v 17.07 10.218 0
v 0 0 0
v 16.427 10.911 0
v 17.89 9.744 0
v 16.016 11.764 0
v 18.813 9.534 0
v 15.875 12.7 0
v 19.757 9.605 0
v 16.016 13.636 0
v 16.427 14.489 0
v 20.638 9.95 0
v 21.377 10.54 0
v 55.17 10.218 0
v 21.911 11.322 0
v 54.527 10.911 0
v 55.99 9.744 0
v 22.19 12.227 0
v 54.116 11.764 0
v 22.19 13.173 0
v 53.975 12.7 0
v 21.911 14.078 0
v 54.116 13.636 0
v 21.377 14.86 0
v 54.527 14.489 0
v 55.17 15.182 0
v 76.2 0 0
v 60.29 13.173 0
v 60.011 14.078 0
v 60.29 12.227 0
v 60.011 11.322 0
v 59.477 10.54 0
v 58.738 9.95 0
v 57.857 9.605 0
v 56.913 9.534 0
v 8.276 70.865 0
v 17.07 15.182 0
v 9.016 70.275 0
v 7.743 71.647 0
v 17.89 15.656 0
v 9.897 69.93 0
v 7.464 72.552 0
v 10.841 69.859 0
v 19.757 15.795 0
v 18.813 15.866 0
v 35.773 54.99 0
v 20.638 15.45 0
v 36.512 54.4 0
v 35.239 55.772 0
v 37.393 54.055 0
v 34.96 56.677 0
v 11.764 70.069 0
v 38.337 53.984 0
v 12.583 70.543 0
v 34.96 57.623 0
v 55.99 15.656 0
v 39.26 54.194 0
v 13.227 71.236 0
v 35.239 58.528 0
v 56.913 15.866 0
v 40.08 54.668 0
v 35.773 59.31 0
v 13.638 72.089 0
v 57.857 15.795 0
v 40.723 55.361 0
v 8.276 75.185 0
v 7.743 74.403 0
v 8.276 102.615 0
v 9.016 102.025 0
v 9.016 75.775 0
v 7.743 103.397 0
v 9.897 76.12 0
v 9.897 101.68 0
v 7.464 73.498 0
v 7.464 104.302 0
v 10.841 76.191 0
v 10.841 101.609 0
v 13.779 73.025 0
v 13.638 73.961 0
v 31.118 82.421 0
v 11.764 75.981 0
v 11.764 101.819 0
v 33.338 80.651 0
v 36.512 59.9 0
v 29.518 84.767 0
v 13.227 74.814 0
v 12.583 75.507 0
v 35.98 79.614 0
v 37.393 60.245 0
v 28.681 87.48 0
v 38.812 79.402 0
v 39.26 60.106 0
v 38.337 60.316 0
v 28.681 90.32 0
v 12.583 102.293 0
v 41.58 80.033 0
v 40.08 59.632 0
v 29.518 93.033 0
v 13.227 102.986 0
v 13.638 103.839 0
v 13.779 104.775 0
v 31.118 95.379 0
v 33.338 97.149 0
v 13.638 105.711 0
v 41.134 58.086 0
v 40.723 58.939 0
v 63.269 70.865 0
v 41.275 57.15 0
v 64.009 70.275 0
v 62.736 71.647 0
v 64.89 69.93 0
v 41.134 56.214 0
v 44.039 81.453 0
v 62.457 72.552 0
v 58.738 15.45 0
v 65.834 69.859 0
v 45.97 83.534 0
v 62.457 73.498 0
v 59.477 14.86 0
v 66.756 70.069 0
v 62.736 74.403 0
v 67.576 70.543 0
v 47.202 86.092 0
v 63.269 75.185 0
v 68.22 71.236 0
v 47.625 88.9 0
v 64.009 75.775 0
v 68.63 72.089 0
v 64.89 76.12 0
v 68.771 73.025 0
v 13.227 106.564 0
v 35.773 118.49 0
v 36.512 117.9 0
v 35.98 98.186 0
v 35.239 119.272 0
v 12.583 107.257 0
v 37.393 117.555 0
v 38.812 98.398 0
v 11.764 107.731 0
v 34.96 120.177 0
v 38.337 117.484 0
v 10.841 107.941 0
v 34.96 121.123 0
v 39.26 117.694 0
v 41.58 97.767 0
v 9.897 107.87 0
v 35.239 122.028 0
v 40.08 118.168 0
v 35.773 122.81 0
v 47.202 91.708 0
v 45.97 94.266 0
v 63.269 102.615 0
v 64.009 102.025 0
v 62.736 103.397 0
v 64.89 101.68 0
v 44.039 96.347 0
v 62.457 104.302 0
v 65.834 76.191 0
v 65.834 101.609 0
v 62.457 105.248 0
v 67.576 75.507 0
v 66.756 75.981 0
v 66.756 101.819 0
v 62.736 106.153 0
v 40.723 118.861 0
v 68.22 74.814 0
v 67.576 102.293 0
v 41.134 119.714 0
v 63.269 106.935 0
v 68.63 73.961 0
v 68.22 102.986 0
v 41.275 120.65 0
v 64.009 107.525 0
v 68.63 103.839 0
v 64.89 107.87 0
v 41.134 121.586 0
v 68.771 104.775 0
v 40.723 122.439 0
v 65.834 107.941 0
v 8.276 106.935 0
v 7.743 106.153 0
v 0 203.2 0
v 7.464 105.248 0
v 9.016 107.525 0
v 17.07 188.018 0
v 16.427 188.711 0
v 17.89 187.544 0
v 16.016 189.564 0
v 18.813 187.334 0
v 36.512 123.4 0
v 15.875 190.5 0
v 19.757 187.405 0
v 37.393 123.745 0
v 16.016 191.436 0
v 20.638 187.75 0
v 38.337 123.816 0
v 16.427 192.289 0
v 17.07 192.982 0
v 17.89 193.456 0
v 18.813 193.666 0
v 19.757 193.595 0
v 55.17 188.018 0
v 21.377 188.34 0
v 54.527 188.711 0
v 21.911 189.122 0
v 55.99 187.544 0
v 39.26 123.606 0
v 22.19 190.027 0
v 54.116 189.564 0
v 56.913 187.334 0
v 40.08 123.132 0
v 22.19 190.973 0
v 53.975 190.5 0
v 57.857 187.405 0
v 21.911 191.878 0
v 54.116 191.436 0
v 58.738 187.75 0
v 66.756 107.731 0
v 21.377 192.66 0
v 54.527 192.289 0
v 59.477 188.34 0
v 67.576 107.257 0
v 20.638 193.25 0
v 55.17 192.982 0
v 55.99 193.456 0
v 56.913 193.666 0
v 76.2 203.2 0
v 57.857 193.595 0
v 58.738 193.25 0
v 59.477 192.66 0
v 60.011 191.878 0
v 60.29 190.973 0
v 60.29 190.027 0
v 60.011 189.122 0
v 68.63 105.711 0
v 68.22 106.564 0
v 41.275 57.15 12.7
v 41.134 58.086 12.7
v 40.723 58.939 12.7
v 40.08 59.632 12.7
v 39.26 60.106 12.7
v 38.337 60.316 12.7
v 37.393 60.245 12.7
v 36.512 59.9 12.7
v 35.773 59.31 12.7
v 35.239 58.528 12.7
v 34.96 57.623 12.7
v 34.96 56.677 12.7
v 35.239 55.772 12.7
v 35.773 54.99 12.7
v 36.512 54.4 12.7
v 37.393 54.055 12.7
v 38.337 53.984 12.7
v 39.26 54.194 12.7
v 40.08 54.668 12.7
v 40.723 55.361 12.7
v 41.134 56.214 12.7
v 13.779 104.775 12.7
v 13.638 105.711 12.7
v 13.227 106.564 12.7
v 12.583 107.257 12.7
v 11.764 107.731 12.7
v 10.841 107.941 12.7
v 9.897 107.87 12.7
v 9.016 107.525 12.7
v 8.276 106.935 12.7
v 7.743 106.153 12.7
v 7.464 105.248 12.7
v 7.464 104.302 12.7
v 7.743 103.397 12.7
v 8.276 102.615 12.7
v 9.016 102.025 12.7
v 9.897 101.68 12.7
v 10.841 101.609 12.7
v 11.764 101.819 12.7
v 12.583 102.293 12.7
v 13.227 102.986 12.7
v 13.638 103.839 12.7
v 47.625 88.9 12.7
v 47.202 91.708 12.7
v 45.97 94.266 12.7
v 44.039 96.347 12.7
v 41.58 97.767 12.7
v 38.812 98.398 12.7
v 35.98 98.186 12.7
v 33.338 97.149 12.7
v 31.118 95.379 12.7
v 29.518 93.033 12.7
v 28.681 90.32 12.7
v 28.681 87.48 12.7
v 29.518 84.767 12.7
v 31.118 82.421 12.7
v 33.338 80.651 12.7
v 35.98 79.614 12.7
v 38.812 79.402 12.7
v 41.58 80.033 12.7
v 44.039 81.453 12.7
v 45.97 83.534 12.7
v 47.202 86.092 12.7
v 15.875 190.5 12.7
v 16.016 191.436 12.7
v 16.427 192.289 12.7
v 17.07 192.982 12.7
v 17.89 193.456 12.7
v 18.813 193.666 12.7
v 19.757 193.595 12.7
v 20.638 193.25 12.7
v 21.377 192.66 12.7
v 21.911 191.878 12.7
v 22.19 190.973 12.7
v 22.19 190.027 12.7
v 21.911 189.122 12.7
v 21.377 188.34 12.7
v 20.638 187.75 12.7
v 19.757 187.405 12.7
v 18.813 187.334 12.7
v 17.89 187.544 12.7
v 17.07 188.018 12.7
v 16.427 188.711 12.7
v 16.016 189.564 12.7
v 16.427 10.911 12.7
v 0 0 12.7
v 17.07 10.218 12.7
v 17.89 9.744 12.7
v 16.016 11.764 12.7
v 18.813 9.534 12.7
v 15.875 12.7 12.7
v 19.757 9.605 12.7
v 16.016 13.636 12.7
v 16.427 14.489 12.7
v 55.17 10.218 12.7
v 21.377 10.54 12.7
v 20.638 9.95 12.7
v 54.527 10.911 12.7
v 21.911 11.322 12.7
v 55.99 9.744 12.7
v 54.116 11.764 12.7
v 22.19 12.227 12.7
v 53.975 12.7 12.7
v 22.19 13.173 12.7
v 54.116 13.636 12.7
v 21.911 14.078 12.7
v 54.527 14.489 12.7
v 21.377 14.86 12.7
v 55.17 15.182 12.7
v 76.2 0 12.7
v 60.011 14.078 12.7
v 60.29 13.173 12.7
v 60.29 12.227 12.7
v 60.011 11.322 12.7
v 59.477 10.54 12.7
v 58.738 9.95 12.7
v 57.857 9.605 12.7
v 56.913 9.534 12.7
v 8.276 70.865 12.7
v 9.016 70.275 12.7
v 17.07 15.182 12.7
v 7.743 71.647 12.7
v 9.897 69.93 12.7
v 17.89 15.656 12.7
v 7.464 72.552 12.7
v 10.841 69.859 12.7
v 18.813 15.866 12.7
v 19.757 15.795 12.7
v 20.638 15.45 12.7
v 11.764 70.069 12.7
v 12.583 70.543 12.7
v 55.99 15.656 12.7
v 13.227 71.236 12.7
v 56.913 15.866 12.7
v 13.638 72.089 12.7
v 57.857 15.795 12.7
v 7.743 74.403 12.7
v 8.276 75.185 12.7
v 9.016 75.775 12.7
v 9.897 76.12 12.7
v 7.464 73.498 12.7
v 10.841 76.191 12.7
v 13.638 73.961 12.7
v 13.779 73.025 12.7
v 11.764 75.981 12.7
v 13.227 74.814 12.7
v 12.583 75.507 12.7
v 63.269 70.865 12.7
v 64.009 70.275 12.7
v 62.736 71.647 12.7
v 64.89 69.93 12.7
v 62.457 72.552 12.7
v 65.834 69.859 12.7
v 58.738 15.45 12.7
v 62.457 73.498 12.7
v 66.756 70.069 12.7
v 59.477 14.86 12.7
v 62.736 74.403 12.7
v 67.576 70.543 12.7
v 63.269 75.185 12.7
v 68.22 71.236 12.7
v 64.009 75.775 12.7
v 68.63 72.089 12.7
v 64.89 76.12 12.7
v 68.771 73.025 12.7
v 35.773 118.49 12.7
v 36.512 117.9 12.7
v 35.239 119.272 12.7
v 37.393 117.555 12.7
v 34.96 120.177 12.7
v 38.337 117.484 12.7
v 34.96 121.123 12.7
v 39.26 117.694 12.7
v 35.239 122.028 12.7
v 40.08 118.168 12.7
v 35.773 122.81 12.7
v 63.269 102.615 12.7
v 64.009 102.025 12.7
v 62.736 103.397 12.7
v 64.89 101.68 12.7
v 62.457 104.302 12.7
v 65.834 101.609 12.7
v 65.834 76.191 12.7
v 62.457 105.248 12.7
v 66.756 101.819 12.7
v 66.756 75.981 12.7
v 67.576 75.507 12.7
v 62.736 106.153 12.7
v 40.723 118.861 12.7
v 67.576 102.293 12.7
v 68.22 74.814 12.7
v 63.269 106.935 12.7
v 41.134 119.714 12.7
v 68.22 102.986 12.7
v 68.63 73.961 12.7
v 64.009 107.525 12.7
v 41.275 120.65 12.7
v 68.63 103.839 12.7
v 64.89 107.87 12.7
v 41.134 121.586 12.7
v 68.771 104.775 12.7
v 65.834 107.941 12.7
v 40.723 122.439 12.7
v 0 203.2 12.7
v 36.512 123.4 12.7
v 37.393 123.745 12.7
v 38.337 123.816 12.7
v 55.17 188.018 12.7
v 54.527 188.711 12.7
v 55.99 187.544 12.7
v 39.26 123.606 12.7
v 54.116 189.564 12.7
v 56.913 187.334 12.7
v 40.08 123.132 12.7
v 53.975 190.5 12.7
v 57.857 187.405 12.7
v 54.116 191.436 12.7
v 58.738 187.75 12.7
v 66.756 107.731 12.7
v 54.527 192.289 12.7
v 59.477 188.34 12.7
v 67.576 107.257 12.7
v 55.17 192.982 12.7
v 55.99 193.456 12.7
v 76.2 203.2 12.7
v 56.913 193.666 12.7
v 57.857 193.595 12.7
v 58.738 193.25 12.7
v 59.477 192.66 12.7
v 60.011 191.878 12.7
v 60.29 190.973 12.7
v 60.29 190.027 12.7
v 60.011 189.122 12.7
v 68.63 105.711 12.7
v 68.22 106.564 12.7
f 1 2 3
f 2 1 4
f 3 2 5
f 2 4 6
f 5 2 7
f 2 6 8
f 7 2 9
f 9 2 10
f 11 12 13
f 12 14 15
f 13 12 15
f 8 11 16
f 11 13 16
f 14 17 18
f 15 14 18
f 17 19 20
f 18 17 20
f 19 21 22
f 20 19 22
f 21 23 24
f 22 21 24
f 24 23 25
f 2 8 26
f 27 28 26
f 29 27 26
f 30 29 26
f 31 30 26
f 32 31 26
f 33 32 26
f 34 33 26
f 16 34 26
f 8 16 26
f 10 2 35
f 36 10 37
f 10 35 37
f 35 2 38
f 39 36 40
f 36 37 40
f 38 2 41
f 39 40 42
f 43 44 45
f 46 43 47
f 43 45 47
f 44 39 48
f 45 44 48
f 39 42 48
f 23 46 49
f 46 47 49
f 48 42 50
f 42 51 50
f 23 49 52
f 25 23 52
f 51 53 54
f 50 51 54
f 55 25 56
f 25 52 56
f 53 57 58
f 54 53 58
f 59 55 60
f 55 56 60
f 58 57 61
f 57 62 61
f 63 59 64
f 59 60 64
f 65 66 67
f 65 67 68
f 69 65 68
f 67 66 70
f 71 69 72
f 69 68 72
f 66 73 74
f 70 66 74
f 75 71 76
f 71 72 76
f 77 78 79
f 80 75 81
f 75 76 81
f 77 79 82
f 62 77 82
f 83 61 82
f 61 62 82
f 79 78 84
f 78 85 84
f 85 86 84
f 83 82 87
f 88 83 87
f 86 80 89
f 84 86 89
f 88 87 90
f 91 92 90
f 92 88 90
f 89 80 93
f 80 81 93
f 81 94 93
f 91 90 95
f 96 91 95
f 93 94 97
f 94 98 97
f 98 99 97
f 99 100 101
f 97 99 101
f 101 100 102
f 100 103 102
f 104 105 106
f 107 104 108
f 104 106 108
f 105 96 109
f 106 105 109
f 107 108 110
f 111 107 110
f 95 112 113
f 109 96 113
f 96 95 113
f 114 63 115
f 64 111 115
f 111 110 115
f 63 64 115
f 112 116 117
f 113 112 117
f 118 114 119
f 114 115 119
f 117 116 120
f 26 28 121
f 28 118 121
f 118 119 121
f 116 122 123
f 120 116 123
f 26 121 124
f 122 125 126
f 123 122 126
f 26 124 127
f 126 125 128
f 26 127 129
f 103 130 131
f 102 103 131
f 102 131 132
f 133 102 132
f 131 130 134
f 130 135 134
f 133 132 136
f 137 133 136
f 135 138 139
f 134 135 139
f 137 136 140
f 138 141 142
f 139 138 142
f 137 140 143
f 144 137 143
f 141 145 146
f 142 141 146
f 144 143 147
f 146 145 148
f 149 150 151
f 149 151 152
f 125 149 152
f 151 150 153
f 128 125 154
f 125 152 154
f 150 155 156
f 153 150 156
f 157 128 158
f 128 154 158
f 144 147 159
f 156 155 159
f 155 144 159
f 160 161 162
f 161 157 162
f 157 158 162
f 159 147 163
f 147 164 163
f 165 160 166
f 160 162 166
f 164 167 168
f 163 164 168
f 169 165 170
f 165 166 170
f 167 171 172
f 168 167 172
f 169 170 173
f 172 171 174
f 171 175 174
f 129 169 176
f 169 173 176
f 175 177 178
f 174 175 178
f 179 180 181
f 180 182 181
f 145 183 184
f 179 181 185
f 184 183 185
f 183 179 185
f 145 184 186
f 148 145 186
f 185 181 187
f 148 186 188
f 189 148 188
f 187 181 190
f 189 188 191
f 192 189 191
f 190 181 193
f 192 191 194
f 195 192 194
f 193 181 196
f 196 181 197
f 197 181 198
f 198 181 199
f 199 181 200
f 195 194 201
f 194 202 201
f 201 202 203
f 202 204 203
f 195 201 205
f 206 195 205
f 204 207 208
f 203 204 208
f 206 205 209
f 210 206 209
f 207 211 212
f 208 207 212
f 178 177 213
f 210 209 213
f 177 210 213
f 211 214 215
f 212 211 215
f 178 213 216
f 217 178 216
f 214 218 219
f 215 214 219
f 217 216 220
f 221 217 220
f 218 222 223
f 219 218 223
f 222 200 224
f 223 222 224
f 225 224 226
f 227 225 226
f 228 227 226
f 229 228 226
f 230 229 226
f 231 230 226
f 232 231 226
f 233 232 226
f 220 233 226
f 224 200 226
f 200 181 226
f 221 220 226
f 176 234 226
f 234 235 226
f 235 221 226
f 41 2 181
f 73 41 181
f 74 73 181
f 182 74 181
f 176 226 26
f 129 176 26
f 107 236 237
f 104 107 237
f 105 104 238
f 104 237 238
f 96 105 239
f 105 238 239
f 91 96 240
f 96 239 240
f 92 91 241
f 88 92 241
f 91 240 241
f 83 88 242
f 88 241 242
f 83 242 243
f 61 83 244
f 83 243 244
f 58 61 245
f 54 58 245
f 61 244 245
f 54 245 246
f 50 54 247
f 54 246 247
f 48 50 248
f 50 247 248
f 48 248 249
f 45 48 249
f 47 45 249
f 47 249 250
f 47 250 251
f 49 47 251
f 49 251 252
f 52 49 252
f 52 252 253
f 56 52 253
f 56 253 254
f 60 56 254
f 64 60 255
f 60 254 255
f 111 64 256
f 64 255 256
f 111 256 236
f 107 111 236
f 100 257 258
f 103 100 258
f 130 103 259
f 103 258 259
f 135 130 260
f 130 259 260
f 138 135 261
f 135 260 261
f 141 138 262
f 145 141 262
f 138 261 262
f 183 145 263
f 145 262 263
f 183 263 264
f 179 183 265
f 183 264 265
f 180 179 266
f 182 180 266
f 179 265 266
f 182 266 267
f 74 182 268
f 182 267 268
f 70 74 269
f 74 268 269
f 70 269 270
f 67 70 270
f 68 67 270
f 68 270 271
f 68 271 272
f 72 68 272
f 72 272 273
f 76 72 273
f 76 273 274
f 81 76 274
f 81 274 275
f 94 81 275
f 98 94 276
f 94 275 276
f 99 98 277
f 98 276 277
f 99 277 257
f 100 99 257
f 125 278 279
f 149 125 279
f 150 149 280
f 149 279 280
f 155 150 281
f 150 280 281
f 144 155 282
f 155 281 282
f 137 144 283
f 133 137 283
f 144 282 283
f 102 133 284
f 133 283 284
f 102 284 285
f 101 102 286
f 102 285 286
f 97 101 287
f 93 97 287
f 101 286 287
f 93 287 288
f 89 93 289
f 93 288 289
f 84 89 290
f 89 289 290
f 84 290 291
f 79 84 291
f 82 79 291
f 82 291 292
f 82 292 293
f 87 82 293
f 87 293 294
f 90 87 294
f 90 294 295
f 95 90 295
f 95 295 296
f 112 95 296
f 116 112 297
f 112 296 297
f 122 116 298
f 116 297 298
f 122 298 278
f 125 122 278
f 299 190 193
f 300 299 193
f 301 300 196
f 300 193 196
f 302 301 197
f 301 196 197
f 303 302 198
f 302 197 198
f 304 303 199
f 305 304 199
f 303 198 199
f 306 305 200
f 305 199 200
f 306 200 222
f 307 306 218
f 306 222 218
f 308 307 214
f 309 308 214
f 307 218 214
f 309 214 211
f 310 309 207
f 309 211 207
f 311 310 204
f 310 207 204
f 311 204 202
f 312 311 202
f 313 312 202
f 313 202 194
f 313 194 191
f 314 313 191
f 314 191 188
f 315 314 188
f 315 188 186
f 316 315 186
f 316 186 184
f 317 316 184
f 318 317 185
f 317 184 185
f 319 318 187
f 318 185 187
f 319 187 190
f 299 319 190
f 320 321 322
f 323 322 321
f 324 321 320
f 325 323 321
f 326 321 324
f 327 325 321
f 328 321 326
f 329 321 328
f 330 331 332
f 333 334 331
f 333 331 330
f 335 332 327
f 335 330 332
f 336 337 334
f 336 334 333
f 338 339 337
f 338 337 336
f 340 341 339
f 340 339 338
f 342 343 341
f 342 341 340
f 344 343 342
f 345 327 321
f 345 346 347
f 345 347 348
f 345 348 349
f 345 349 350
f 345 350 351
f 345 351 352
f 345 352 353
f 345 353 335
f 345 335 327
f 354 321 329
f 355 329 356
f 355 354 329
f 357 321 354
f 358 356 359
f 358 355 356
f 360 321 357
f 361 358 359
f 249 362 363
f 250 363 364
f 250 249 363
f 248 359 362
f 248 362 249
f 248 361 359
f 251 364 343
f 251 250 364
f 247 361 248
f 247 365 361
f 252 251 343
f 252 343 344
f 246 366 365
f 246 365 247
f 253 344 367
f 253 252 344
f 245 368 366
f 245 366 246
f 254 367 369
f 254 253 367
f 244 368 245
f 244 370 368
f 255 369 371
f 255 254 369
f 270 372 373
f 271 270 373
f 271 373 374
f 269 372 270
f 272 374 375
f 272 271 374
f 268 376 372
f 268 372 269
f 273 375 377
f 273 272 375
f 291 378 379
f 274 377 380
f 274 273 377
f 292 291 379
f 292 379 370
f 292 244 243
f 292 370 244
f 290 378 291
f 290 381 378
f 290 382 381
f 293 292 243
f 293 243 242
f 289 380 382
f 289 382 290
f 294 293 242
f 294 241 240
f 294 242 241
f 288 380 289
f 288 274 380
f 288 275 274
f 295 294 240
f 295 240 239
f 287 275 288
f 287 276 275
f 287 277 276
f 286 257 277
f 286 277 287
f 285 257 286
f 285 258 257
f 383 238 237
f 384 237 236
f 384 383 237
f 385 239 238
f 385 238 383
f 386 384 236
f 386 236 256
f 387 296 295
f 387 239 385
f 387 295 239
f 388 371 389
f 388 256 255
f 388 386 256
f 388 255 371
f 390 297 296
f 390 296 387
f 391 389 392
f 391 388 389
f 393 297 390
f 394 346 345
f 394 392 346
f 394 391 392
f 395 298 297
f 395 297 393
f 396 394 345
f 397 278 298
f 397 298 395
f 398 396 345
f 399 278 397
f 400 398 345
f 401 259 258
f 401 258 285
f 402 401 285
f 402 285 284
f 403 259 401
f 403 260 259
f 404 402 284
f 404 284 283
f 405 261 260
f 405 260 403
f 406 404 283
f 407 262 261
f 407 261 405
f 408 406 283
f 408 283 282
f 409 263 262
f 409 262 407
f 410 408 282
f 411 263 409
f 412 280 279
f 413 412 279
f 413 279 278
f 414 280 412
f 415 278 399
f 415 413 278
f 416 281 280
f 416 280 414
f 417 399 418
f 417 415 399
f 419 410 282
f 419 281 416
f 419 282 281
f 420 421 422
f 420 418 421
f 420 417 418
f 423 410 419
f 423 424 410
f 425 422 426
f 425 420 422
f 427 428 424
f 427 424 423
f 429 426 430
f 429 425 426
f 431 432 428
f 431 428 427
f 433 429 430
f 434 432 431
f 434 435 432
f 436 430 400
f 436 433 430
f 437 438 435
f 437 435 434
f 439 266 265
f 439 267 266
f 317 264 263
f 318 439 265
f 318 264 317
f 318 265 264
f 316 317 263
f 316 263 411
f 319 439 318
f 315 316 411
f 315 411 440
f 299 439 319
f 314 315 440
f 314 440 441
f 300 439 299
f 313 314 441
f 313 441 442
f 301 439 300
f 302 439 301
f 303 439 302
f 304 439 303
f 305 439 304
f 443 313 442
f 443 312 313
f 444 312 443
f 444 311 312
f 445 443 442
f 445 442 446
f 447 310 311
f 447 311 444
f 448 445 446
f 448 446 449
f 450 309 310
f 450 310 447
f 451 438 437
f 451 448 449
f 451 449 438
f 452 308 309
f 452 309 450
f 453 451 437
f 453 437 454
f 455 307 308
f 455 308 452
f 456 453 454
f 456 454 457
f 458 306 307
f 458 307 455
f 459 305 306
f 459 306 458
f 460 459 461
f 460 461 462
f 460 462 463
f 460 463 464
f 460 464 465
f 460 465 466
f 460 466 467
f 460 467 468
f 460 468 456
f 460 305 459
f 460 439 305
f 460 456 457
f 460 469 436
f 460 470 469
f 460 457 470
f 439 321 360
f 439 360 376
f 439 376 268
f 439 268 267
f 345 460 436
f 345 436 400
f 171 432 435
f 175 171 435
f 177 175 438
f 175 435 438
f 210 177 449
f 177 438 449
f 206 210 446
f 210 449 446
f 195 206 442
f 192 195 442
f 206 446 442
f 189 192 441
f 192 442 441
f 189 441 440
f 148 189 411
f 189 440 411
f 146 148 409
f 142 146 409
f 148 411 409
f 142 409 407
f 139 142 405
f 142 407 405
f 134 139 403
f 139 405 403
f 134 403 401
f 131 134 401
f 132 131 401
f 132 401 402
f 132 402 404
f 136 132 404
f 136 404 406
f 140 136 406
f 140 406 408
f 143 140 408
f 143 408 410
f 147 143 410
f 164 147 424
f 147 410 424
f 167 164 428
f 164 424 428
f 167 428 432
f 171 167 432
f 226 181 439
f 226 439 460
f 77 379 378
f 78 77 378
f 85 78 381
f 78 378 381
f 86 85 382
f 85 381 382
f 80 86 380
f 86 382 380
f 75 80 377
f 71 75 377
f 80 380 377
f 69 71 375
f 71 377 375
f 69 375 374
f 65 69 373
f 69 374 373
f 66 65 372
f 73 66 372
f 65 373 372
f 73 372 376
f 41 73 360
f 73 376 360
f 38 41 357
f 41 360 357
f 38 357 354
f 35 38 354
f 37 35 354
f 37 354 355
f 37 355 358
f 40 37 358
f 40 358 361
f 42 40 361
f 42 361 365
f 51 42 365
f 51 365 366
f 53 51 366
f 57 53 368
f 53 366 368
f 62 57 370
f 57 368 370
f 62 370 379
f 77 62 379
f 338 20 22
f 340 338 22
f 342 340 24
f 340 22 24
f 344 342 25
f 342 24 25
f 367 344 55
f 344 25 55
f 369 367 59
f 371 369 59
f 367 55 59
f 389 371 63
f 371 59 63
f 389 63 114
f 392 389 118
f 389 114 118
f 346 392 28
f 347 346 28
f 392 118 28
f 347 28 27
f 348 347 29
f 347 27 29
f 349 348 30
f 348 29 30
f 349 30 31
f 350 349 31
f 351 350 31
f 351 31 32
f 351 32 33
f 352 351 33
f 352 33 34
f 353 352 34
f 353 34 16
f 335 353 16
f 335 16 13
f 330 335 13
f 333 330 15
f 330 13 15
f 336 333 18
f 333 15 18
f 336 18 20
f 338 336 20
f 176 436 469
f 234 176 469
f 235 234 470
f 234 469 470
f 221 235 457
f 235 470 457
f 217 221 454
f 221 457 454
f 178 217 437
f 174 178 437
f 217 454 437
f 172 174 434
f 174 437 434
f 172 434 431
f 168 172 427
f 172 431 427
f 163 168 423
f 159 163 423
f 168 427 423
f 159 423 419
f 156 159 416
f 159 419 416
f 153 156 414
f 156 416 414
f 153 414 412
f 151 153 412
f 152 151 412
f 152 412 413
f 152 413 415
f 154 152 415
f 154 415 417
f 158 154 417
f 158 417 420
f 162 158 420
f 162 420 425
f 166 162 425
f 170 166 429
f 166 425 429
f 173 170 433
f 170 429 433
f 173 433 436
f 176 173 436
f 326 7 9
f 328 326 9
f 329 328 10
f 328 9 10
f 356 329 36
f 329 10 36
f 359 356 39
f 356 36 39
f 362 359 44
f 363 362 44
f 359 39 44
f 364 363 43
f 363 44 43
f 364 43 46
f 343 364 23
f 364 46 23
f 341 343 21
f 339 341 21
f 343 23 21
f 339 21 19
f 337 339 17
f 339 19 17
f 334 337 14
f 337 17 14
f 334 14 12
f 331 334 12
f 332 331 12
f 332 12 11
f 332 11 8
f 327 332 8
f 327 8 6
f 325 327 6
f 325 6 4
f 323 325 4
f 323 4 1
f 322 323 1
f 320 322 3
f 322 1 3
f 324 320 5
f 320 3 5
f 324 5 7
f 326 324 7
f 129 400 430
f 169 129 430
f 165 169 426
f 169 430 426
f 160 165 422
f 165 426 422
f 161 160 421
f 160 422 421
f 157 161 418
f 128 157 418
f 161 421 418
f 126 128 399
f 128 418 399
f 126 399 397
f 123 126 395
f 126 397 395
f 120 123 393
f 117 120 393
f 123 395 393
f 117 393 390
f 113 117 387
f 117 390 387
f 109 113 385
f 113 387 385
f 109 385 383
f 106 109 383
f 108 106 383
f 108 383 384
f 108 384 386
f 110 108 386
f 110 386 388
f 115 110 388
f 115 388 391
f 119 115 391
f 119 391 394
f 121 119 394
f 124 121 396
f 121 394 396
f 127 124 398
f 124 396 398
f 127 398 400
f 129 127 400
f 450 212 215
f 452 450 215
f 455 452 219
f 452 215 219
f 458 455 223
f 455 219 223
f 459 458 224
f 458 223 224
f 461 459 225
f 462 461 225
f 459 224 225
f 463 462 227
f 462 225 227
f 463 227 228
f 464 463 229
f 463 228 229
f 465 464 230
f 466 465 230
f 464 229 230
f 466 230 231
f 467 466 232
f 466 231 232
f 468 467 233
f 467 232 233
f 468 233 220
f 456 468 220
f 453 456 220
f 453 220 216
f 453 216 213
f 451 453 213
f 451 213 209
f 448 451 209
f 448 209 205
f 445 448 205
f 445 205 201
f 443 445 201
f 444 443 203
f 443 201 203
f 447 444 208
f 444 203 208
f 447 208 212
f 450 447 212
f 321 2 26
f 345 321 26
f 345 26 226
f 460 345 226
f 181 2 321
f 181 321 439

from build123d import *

# Parameters (mm, degrees)
SKETCH1_W           = 76.2
SKETCH1_H           = 203.2
BOSS_EXTRUDE1_DEPTH = 12.7
SKETCH2_R           = 3.175
CUT_EXTRUDE1_DEPTH  = 12.7
SKETCH3_R           = 9.525
CUT_EXTRUDE2_DEPTH  = 12.7
SKETCH4_R           = 3.175
CUT_EXTRUDE3_DEPTH  = 12.7


with BuildPart() as part:
    # Sketch1 → Boss-Extrude1 (new body)
    with BuildSketch(Plane.XY):
        with Locations((38.1, 101.6)):
            Rectangle(SKETCH1_W, SKETCH1_H)
    extrude(amount=BOSS_EXTRUDE1_DEPTH)

    # Sketch2 → Cut-Extrude1 (cut)
    with BuildSketch(Plane(origin=(0, 0, 0), x_dir=(-1, 0, 0), z_dir=(0, 0, -1))):
        with Locations((-57.15, 190.5)):
            Circle(SKETCH2_R)
        with Locations((-19.05, 190.5)):
            Circle(SKETCH2_R)
        with Locations((-19.05, 12.7)):
            Circle(SKETCH2_R)
        with Locations((-57.15, 12.7)):
            Circle(SKETCH2_R)
    extrude(amount=-CUT_EXTRUDE1_DEPTH, mode=Mode.SUBTRACT)

    # Sketch3 → Cut-Extrude2 (cut)
    with BuildSketch(Plane.XY.offset(12.7)):
        with Locations((38.1, 88.9)):
            Circle(SKETCH3_R)
    extrude(amount=-CUT_EXTRUDE2_DEPTH, mode=Mode.SUBTRACT)

    # Sketch4 → Cut-Extrude3 (cut)
    with BuildSketch(Plane.XY.offset(12.7)):
        with Locations((38.1, 120.65)):
            Circle(SKETCH4_R)
        with Locations((65.59630657, 104.775)):
            Circle(SKETCH4_R)
        with Locations((65.59630657, 73.025)):
            Circle(SKETCH4_R)
        with Locations((38.1, 57.15)):
            Circle(SKETCH4_R)
        with Locations((10.60369343, 73.025)):
            Circle(SKETCH4_R)
        with Locations((10.60369343, 104.775)):
            Circle(SKETCH4_R)
    extrude(amount=-CUT_EXTRUDE3_DEPTH, mode=Mode.SUBTRACT)


solid = part.part
